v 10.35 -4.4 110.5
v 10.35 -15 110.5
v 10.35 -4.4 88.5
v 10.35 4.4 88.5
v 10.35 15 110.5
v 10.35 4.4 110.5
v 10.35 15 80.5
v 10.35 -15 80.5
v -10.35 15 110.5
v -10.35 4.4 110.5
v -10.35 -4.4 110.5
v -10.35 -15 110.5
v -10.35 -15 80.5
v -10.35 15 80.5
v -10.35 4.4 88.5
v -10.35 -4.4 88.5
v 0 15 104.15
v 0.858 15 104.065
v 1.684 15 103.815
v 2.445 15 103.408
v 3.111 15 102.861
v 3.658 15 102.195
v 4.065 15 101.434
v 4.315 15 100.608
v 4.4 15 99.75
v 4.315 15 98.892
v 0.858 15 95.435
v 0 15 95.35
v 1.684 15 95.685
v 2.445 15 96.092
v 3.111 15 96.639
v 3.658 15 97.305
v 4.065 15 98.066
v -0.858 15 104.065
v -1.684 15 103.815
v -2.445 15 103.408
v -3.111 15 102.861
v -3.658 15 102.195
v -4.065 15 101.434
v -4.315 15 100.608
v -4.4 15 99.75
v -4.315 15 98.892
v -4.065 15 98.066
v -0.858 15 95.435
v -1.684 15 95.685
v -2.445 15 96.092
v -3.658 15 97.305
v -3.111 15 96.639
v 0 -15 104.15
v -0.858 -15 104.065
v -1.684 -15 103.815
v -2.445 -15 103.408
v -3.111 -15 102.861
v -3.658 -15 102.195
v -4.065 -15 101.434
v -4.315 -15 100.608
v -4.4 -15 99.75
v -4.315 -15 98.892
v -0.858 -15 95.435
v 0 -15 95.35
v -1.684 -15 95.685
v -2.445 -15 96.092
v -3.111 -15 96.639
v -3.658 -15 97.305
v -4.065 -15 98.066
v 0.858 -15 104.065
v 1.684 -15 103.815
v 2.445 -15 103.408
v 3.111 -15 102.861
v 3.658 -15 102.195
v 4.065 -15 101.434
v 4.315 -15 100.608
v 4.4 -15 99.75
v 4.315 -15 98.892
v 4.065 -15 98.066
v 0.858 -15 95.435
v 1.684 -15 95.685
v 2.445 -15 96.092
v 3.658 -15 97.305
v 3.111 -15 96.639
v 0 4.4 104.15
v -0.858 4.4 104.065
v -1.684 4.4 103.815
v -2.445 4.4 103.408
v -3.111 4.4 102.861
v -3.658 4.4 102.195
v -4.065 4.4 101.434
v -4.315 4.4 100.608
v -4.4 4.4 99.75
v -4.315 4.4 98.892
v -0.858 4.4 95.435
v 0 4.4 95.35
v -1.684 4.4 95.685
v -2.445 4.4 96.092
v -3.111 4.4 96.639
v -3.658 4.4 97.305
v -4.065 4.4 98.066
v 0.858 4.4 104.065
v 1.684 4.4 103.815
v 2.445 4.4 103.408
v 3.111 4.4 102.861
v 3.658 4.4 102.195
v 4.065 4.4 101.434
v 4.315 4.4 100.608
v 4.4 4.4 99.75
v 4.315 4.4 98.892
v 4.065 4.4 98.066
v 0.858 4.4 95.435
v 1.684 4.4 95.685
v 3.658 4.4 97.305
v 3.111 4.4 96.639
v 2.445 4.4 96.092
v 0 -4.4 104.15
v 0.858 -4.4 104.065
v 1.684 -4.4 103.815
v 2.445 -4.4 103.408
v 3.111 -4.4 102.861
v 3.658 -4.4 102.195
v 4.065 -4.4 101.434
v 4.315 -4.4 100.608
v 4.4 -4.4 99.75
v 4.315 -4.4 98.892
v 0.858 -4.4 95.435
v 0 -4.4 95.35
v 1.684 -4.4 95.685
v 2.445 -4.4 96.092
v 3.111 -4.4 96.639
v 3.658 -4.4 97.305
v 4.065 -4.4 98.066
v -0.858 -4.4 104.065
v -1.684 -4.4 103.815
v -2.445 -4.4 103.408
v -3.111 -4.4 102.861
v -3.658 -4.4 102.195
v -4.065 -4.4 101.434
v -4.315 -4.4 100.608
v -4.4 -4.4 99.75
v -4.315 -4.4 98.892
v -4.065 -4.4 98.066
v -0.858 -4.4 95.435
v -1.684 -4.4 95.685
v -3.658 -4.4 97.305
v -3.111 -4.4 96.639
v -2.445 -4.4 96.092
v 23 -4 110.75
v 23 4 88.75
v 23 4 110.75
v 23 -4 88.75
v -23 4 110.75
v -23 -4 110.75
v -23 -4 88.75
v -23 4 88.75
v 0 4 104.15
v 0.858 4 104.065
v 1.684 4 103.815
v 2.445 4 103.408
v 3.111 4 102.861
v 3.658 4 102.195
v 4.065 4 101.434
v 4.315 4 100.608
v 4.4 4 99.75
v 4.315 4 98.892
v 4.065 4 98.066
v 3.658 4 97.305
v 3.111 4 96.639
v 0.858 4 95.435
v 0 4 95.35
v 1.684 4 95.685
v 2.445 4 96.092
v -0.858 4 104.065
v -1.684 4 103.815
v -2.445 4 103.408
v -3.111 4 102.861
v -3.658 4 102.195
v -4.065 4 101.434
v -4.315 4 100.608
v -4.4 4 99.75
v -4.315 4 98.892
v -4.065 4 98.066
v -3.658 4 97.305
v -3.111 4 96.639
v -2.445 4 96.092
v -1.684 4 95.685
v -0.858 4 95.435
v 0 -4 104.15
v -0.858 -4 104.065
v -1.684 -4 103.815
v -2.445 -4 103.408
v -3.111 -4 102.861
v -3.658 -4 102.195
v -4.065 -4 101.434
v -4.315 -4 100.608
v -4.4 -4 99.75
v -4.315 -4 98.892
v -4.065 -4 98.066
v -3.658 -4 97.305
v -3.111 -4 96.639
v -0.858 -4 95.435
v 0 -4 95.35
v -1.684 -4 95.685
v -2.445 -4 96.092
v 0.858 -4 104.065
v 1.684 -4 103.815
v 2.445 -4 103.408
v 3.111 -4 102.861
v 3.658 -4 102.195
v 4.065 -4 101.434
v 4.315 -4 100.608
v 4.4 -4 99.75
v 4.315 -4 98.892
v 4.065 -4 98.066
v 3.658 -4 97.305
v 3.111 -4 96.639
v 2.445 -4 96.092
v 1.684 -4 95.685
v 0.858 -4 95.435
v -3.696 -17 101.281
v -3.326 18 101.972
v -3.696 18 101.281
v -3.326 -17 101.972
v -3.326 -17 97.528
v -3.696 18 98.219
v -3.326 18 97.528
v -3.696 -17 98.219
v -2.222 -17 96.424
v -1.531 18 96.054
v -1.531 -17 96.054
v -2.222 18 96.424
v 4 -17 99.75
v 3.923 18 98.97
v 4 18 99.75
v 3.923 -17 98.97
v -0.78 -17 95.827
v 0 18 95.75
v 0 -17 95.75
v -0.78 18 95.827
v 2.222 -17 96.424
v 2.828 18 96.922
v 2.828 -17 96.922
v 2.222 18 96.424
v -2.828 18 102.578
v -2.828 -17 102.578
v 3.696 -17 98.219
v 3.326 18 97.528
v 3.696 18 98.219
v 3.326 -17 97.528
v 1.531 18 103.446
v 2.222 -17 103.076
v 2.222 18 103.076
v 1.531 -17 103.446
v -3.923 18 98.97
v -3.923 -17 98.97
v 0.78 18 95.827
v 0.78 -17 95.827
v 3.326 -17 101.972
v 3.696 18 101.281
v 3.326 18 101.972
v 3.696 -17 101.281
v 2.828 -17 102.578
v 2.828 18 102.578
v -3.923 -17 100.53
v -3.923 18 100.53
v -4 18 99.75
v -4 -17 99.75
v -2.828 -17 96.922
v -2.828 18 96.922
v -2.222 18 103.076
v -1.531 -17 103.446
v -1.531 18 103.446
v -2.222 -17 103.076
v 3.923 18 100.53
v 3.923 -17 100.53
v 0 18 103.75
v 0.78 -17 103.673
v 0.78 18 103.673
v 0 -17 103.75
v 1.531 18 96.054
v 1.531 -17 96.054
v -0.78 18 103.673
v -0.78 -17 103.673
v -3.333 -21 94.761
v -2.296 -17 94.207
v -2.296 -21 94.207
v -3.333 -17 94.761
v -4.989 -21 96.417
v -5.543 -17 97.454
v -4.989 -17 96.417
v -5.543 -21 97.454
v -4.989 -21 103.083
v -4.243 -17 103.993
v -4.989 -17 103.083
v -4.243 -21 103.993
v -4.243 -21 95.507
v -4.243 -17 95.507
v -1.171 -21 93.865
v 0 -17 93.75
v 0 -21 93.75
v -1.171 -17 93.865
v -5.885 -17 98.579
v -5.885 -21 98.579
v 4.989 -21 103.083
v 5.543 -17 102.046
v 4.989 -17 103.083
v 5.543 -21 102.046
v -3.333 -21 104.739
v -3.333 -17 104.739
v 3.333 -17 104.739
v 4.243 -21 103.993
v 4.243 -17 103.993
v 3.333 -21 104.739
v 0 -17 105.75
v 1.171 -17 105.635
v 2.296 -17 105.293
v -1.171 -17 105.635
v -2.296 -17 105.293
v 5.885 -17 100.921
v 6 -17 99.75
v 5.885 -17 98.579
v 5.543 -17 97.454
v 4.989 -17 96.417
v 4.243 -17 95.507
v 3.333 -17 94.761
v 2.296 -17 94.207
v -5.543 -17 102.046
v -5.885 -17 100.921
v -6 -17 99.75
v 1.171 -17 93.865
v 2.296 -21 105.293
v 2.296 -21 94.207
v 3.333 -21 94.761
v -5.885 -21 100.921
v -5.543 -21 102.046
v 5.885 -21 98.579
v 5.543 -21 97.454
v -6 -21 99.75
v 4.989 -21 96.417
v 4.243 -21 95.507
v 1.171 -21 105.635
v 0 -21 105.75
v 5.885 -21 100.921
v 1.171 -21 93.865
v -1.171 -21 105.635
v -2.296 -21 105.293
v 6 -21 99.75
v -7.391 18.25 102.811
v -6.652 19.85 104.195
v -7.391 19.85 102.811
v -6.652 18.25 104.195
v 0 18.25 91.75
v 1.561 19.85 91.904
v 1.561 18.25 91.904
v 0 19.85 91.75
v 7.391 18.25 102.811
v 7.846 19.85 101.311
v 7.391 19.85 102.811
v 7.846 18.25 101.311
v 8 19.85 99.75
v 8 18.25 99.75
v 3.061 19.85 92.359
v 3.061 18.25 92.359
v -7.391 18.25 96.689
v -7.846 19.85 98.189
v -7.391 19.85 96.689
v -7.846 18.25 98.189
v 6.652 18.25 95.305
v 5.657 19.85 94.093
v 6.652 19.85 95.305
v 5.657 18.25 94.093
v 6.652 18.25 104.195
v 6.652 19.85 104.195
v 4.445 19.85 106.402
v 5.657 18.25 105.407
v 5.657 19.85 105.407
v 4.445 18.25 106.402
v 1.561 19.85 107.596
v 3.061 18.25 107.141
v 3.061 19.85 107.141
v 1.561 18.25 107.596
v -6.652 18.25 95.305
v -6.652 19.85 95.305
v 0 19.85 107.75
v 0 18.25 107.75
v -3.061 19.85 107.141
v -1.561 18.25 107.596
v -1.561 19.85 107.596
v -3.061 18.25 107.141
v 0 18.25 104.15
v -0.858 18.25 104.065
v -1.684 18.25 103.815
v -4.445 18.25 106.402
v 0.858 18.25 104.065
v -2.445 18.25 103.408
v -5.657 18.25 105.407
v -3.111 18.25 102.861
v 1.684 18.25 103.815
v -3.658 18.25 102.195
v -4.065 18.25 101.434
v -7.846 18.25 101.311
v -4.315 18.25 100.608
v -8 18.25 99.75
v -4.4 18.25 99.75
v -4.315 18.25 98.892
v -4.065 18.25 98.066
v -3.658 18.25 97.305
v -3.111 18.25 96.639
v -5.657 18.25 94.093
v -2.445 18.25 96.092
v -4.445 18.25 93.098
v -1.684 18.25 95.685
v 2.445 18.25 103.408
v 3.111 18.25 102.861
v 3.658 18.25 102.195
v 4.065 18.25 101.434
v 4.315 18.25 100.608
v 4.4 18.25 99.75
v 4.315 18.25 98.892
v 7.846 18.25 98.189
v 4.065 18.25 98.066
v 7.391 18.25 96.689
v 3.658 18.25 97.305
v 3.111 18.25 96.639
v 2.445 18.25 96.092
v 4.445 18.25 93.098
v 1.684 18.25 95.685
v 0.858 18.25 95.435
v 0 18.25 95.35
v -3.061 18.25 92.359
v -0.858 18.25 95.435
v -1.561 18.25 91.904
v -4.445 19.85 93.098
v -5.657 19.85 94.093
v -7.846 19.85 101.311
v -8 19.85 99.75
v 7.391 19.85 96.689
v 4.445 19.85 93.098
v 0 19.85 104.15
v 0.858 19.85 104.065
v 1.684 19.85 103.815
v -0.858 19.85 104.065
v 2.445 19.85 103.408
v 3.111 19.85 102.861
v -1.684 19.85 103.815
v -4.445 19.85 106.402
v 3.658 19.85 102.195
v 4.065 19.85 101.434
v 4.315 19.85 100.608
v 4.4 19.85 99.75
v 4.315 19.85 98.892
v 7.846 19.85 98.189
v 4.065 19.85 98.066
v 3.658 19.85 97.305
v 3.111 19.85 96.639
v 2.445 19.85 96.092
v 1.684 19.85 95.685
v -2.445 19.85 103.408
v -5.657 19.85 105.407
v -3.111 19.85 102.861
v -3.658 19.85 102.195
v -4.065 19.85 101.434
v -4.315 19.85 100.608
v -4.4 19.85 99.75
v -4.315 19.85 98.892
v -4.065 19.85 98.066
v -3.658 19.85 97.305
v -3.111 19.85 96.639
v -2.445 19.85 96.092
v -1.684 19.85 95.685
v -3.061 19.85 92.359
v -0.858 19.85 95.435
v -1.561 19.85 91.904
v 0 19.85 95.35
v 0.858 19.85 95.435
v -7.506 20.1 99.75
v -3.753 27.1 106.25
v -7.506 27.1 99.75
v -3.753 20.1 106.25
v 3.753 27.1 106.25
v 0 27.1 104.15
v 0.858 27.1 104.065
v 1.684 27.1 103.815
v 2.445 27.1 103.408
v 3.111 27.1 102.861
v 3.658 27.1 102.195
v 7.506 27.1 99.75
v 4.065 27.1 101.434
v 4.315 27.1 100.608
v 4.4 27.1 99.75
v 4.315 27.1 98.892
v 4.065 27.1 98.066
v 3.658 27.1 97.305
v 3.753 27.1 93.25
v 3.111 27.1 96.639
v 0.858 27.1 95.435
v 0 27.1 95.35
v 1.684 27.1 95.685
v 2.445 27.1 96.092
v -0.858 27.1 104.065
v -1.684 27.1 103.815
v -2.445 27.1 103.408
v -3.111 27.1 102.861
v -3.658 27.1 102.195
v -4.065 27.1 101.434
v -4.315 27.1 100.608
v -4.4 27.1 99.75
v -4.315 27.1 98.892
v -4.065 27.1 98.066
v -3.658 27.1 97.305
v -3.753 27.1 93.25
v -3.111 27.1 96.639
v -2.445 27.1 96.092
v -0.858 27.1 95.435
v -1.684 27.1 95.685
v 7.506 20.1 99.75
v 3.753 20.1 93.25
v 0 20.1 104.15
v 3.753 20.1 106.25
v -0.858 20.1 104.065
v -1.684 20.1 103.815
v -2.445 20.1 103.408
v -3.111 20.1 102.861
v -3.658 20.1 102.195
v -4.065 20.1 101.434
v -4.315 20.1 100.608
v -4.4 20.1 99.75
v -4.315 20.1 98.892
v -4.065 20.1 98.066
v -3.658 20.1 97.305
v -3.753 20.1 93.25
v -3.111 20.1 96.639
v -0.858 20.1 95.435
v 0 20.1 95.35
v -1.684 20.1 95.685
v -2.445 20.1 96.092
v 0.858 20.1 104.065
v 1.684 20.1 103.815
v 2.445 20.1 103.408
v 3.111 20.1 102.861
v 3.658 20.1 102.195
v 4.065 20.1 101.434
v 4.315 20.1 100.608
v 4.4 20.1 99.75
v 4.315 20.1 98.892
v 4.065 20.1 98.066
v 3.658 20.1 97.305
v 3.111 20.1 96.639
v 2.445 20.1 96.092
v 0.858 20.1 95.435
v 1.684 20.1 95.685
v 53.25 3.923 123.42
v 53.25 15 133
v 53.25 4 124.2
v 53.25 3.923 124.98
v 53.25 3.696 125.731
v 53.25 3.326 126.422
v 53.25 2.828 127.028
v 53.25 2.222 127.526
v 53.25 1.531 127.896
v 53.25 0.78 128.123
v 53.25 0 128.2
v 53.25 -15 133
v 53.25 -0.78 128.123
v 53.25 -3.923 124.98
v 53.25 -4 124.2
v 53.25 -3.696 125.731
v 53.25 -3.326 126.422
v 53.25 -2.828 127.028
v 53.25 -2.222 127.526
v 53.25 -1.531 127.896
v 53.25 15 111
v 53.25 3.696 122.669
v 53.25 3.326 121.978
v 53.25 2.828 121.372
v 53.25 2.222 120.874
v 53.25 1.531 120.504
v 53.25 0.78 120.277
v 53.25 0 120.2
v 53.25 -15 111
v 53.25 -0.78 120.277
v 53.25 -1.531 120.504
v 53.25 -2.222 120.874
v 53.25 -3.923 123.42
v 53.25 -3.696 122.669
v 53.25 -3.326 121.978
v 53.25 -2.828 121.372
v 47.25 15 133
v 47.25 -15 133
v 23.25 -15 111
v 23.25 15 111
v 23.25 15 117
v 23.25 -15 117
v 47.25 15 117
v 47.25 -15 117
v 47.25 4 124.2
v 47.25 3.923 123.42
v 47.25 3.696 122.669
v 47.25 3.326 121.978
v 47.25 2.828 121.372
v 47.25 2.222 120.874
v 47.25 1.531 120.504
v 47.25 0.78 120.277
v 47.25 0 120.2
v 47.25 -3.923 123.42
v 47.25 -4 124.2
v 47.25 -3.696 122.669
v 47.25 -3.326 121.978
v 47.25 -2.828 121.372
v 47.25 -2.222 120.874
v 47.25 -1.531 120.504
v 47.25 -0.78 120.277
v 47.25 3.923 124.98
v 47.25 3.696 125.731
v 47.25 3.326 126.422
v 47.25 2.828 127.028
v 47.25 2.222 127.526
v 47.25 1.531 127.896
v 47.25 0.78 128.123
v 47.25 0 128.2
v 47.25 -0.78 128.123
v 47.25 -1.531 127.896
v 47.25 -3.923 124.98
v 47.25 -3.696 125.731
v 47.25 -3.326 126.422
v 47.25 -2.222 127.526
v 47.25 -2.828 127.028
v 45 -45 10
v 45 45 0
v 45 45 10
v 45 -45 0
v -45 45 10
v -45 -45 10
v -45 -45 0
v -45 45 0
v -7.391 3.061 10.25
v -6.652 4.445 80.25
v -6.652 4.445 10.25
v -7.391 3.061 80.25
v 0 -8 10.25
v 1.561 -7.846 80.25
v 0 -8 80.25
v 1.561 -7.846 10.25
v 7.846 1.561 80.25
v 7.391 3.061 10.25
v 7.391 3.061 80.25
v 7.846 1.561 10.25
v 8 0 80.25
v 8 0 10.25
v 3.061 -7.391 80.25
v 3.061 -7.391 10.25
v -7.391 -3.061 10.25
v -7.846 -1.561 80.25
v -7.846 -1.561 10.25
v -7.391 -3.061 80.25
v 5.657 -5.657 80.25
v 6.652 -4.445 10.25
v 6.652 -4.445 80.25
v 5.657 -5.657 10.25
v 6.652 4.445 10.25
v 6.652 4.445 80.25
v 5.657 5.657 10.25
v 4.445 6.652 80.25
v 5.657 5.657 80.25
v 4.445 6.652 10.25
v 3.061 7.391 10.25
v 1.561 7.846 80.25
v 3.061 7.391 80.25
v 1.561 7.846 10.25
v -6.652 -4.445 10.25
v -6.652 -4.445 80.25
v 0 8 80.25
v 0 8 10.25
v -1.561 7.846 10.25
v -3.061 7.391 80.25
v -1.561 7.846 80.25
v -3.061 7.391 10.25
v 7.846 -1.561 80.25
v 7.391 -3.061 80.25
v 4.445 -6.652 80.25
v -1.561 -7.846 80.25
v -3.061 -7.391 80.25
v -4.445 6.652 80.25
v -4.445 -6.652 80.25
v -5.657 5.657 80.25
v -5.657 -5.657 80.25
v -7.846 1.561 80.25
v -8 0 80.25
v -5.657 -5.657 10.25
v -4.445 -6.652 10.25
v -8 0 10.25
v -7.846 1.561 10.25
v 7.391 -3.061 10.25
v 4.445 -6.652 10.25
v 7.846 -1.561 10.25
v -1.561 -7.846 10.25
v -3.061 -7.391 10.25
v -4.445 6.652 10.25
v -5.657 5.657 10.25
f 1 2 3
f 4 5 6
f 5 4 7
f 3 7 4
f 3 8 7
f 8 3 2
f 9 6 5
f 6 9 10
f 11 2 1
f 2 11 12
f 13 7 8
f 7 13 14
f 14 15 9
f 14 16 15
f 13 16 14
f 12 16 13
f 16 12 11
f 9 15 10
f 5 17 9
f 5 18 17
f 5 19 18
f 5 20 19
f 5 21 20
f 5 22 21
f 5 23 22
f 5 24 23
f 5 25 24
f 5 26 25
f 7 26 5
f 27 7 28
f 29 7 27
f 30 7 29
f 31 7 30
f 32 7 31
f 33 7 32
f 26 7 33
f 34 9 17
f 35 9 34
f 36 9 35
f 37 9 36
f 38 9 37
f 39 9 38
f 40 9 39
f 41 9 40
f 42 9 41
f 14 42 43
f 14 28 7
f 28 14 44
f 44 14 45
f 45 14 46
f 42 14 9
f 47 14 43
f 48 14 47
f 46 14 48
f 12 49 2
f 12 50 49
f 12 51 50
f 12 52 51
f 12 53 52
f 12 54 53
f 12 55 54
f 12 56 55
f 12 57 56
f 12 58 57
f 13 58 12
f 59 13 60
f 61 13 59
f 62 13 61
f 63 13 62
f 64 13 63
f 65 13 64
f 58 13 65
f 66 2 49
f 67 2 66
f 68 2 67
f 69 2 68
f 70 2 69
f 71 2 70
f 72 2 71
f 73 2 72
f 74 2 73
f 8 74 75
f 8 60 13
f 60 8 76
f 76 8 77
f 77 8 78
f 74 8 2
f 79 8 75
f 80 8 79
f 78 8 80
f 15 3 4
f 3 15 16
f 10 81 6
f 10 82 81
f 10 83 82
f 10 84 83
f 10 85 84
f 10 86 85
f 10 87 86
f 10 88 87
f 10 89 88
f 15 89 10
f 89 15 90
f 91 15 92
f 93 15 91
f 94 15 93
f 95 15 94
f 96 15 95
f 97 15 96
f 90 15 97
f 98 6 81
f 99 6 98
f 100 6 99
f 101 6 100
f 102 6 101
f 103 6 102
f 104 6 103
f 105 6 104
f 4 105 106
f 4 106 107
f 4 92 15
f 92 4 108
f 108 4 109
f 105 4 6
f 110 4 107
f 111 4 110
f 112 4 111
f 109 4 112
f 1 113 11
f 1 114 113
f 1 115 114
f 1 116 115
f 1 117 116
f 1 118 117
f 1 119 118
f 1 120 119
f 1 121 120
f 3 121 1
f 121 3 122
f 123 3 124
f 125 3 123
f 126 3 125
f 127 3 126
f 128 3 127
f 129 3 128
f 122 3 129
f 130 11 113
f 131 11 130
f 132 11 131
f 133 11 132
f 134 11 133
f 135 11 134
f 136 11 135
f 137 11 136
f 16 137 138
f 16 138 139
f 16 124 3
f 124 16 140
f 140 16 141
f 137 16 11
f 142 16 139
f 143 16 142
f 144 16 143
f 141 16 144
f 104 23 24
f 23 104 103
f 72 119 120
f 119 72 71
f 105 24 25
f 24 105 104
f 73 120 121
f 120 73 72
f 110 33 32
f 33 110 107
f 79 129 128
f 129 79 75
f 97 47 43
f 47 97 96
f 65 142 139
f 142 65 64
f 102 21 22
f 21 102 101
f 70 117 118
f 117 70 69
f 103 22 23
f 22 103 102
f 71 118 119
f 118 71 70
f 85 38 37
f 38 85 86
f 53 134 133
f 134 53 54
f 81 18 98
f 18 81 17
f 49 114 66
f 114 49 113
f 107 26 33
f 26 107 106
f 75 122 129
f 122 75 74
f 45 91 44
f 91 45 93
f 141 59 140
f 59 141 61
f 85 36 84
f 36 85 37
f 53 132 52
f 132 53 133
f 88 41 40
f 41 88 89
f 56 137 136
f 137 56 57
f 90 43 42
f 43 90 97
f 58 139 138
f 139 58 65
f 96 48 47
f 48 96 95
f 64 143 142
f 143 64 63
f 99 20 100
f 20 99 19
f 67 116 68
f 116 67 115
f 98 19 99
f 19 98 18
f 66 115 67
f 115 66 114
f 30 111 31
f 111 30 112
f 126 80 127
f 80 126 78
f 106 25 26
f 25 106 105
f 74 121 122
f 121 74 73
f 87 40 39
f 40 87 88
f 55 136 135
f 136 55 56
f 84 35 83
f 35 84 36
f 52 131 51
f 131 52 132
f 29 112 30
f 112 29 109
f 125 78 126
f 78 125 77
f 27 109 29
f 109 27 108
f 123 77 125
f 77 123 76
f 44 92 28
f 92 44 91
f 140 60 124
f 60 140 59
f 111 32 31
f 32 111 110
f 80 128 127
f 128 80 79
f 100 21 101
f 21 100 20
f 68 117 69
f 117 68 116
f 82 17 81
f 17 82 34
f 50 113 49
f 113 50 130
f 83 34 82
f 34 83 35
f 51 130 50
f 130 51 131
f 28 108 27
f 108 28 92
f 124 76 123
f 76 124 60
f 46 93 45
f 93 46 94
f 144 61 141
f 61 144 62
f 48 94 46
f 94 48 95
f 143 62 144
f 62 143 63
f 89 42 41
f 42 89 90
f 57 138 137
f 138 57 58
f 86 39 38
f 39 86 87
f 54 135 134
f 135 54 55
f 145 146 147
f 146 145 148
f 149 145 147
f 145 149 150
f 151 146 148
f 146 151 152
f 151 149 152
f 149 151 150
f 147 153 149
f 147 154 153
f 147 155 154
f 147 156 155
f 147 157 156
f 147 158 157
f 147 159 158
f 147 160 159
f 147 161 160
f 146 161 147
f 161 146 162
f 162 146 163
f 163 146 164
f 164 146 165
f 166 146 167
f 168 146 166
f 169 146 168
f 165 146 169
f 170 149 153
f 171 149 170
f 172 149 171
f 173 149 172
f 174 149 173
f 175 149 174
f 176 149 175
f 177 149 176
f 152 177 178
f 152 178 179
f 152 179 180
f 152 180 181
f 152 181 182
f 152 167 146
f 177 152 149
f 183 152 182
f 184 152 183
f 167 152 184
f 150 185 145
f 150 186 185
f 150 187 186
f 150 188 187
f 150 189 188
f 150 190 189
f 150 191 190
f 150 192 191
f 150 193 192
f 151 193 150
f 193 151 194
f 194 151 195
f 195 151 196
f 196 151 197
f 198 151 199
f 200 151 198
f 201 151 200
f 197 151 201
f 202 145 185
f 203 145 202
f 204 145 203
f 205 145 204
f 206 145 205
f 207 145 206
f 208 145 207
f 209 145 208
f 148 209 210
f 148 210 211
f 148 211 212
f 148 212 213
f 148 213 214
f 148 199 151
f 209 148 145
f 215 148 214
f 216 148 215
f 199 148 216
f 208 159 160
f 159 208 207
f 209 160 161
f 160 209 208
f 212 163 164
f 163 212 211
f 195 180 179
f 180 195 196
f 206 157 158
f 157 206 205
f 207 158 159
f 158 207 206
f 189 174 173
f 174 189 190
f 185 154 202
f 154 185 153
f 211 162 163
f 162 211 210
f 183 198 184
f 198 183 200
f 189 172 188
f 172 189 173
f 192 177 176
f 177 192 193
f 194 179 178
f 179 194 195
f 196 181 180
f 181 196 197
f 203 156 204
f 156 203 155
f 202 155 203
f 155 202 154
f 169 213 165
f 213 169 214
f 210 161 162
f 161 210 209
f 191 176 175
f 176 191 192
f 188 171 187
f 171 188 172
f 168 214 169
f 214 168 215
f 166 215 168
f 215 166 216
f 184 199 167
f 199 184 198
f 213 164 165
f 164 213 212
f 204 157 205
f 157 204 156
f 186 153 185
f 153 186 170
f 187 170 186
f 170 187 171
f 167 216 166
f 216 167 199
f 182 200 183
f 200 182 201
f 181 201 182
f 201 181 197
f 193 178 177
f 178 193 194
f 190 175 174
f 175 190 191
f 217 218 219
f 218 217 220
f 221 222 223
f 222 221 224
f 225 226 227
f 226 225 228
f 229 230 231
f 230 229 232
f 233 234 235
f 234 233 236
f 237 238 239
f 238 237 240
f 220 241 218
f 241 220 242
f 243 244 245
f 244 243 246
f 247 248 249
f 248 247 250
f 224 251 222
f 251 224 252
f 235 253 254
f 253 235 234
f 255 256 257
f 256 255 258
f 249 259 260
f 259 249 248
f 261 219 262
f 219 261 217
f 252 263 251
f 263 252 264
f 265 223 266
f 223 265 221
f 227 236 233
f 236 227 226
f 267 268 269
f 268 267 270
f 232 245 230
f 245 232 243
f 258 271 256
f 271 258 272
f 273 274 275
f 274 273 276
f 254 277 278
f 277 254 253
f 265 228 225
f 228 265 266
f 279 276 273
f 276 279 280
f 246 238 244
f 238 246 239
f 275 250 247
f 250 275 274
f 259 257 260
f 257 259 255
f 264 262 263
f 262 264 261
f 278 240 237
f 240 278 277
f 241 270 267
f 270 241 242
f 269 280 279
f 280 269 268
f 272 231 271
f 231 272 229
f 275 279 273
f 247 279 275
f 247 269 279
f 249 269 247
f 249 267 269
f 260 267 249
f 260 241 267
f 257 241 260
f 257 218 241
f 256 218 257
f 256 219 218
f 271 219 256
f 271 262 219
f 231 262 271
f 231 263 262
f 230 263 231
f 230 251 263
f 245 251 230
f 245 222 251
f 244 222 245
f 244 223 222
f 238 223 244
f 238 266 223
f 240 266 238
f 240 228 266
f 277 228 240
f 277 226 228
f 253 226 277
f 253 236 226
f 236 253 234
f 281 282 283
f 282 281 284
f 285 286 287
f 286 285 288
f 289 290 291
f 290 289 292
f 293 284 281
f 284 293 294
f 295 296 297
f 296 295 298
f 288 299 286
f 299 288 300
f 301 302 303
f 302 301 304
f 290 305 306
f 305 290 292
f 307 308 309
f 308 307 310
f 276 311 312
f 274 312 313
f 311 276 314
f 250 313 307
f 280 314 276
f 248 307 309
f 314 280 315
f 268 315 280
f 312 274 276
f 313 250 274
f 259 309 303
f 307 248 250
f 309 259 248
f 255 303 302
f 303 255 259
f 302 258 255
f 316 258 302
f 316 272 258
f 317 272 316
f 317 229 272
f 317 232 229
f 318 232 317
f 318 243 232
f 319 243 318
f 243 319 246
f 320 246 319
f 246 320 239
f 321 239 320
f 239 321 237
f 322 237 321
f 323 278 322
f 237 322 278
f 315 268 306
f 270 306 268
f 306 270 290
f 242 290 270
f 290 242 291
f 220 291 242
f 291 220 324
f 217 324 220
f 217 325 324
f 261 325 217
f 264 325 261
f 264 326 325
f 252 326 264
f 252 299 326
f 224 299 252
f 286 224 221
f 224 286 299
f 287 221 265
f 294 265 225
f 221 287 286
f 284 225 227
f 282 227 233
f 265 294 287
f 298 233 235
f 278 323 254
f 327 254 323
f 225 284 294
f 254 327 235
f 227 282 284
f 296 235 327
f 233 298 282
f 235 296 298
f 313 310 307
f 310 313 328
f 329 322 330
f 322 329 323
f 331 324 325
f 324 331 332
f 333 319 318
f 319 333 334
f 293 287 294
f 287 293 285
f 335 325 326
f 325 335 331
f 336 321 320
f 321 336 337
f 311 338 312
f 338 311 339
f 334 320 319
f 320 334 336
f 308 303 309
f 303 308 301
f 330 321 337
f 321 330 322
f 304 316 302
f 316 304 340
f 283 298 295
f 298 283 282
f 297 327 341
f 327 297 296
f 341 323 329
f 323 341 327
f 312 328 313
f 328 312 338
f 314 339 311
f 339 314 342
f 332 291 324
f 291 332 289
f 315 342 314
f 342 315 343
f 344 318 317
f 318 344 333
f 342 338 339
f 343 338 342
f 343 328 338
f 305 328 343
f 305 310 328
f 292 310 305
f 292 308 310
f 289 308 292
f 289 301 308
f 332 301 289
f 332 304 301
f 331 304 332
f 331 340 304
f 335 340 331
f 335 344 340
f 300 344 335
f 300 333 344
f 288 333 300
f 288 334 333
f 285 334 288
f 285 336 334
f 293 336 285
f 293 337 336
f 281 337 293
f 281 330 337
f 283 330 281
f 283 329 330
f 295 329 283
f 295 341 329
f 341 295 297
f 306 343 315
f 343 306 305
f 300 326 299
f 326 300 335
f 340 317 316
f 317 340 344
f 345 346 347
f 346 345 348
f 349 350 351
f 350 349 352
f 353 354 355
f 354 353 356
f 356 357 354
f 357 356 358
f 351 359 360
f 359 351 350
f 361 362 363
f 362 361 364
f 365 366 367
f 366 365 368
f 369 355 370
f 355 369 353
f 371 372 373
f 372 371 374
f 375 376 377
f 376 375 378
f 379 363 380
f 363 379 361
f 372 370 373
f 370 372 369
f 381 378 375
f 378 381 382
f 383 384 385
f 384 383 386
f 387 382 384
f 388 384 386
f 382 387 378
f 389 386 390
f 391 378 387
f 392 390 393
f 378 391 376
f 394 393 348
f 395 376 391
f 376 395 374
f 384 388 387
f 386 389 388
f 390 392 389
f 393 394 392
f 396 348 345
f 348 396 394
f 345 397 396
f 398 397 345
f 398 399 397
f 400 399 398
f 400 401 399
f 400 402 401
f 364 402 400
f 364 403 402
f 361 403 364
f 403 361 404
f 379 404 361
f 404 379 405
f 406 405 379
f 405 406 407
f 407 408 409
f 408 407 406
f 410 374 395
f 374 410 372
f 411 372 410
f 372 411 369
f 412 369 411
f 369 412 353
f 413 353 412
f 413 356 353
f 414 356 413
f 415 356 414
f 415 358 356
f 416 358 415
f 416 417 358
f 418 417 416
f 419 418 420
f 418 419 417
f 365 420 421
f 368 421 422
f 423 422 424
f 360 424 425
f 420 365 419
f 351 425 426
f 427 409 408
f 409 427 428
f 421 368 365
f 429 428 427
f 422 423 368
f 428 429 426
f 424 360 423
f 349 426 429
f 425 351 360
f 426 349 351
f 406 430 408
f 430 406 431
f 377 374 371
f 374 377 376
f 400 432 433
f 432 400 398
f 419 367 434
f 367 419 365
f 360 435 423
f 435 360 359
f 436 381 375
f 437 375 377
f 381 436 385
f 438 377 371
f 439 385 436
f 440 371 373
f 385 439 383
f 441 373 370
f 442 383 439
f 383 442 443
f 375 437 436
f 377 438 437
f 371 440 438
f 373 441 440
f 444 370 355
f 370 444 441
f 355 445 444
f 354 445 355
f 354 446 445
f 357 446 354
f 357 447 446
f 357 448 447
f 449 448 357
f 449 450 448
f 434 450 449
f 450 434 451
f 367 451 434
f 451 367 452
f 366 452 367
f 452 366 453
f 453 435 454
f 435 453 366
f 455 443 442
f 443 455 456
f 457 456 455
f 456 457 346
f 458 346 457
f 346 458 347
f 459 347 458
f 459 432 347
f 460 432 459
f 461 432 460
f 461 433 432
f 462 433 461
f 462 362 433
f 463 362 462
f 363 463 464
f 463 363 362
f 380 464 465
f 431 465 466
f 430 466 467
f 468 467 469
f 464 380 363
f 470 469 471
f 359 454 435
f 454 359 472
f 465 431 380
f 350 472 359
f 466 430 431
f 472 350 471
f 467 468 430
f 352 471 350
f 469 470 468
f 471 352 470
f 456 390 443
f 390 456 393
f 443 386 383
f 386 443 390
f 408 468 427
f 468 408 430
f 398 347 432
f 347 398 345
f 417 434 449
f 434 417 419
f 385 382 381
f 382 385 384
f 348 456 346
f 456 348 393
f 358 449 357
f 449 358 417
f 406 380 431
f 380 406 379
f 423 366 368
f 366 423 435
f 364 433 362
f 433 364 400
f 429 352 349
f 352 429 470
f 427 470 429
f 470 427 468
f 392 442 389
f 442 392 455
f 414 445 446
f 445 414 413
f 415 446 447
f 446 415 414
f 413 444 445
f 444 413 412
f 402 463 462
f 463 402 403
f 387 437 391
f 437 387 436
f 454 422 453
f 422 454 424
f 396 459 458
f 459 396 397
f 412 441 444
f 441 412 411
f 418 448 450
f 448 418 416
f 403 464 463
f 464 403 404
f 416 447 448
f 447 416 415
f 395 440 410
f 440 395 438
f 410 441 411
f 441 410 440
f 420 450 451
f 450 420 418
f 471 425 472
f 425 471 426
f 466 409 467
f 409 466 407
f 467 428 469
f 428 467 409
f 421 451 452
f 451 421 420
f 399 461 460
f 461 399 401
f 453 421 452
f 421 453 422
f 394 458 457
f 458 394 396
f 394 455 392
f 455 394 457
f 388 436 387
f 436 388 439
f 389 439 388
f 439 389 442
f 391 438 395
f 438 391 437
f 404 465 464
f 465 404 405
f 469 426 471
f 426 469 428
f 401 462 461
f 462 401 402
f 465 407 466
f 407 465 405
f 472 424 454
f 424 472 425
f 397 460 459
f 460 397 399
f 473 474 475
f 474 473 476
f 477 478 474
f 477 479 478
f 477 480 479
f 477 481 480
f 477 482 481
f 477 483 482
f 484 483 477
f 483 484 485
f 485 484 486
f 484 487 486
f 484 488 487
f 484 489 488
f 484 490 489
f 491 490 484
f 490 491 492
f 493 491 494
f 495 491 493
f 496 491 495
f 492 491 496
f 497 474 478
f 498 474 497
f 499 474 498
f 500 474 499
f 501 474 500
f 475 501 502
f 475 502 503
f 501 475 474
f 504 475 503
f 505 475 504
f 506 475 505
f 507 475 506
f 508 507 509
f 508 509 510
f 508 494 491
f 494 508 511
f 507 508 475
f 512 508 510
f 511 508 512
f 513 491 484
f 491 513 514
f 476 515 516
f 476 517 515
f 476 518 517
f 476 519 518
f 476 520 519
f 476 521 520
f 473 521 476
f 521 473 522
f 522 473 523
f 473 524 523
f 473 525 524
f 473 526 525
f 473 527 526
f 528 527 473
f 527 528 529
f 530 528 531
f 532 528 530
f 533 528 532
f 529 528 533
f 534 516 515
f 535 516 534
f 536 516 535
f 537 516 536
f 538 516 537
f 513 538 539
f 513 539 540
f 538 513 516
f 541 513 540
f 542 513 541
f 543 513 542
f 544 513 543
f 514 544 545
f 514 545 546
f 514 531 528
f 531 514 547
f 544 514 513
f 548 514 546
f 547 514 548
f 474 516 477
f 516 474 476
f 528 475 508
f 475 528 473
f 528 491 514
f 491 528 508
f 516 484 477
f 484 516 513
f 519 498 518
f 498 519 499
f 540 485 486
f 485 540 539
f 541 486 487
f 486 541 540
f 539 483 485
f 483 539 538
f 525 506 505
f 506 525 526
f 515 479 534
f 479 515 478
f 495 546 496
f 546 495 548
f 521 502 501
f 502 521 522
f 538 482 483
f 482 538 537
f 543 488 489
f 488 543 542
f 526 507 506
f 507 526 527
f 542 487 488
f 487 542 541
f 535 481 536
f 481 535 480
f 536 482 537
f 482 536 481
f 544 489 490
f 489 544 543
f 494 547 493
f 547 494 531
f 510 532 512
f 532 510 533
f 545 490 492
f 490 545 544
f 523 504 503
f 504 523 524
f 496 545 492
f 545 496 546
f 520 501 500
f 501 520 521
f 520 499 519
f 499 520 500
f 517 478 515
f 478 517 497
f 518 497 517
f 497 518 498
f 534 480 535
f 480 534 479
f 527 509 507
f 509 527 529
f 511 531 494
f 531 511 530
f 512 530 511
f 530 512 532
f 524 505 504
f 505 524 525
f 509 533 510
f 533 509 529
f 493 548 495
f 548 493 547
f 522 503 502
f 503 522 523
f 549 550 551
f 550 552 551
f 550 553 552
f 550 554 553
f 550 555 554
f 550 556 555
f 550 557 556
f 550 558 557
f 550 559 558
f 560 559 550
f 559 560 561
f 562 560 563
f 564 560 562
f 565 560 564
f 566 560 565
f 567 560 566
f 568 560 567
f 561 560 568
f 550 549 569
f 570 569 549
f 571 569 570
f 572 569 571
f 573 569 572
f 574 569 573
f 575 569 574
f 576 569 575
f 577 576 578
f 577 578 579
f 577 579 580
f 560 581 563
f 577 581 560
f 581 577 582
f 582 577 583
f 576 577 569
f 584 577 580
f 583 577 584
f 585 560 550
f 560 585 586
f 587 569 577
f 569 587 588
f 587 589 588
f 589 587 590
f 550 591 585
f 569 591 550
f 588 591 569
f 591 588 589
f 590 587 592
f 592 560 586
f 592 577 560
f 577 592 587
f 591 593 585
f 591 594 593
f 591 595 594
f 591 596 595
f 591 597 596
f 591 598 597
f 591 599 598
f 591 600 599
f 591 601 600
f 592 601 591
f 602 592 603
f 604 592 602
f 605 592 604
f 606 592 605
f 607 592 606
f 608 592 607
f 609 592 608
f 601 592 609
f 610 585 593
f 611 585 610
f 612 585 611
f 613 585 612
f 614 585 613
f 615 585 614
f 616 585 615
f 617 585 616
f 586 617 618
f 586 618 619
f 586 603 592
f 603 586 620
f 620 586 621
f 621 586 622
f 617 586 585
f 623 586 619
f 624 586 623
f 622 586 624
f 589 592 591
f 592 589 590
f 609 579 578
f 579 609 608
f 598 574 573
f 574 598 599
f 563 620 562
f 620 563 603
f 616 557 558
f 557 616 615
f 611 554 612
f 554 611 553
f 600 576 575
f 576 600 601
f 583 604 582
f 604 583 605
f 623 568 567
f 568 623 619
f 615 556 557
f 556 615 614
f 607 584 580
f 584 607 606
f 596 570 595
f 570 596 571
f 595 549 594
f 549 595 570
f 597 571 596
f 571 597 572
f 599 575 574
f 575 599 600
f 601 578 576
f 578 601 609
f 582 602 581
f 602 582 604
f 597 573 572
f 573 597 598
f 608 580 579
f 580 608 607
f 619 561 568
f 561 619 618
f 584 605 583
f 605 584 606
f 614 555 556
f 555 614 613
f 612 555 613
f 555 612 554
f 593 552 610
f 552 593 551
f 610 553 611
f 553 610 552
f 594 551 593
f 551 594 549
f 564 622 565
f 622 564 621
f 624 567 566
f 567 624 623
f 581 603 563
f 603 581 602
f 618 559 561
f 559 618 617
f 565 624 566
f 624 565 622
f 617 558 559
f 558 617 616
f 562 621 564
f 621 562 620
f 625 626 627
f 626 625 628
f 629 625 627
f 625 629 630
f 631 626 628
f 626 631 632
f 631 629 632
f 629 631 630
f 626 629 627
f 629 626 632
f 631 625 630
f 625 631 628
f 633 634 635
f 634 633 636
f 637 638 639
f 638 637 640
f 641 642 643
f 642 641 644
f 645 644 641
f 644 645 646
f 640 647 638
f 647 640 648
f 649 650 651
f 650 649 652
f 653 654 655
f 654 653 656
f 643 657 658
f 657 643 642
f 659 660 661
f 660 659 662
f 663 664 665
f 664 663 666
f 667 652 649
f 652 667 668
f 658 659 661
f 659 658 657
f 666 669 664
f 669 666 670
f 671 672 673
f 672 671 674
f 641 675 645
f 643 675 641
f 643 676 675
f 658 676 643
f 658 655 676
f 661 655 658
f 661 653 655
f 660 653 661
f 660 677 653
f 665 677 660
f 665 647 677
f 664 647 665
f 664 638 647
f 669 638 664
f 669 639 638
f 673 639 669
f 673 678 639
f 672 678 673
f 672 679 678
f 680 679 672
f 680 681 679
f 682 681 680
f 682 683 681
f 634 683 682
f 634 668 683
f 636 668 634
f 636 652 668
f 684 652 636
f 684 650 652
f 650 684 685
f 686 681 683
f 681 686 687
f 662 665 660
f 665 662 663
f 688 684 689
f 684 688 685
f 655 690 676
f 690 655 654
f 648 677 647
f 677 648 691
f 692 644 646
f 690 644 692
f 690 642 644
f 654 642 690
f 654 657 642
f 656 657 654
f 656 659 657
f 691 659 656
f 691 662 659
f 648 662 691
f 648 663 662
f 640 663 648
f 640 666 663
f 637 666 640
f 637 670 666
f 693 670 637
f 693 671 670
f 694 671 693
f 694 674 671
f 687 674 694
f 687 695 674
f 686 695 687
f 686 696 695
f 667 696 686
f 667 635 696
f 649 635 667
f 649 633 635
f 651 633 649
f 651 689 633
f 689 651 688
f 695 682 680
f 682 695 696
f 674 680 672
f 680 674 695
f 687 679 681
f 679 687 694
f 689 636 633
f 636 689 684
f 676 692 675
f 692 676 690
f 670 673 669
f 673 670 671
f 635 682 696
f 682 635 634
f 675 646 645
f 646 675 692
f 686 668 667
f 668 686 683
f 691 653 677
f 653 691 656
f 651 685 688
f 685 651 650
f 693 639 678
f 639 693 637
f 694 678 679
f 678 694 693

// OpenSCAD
$fn = 32;

// ------------------------------------------------------------------------
// Lamp arm: column d16 x 70 mm, arm 46 mm
// Every part is its own module, assembly() places every instance.
// ------------------------------------------------------------------------

// --- part 1 ---
module lamp_base() {
  difference() {
    translate([-45, -45, 0]) cube([90, 90, 10]);
  }
}

// --- part 2 ---
module lamp_column() {
  cylinder(h = 70, d = 16);
}

// --- part 3 ---
module head_fork() {
  difference() {
    translate([-10.35, -15, 0]) cube([20.7, 30, 30]);
    translate([-11.35, -4.4, 8]) cube([22.7, 8.8, 23]);
    translate([0, 0, 19.25]) rotate([90, 0, 0]) cylinder(h = 32, d = 8.8, center = true);
  }
}

// --- part 4 ---
module lamp_arm() {
  difference() {
    translate([-23, -4, 0]) cube([46, 8, 22]);
    translate([0, 0, 11]) rotate([90, 0, 0]) cylinder(h = 10, d = 8.8, center = true);
  }
}

// --- part 5 ---
module arm_pin() {
  rotate([0, 90, 0]) cylinder(h = 36, d = 8, center = true);
  translate([-21, 0, 0]) rotate([0, 90, 0]) cylinder(h = 4, d = 12);
}

// --- part 6 ---
module arm_washer() {
  difference() {
      translate([0, 0, 0]) cylinder(h = 1.6, d = 16);
      translate([0, 0, -1]) cylinder(h = 3.6, d = 8.8);
    }
}

// --- part 7 ---
module arm_nut() {
  difference() {
    linear_extrude(height = 7) polygon(points = [[7.506, 0], [3.753, 6.5], [-3.753, 6.5], [-7.506, 0], [-3.753, -6.5], [3.753, -6.5]]);
    translate([0, 0, -1]) cylinder(h = 9, d = 8.8);
  }
}

// --- part 8 ---
module shade_bracket() {
  difference() {
    translate([-15, -15, 0]) cube([30, 30, 22]);
    translate([-16, -16, 6]) cube([25, 32, 17]);
    translate([12, 0, 13.2]) rotate([0, 90, 0]) cylinder(h = 8, d = 8, center = true);
  }
}

// --- assembly ---
module assembly() {
  color([0.80, 0.24, 0.20]) translate([0, 0, 0]) rotate([0, 0, 0]) lamp_base();
  color([0.20, 0.45, 0.75]) translate([0, 0, 10.25]) rotate([0, 0, 0]) lamp_column();
  color([0.25, 0.62, 0.32]) translate([0, 0, 80.5]) rotate([0, 0, 0]) head_fork();
  color([0.92, 0.70, 0.18]) translate([0, 0, 88.75]) rotate([0, 0, 0]) lamp_arm();
  color([0.58, 0.35, 0.70]) translate([0, 0, 99.75]) rotate([0, 0, 90]) arm_pin();
  color([0.16, 0.66, 0.66]) translate([0, 19.85, 99.75]) rotate([90, 0, 0]) arm_washer();
  color([0.85, 0.48, 0.18]) translate([0, 27.1, 99.75]) rotate([90, 0, 0]) arm_nut();
  color([0.55, 0.60, 0.65]) translate([38.25, 0, 111]) rotate([0, 0, 0]) shade_bracket();
}

assembly();
